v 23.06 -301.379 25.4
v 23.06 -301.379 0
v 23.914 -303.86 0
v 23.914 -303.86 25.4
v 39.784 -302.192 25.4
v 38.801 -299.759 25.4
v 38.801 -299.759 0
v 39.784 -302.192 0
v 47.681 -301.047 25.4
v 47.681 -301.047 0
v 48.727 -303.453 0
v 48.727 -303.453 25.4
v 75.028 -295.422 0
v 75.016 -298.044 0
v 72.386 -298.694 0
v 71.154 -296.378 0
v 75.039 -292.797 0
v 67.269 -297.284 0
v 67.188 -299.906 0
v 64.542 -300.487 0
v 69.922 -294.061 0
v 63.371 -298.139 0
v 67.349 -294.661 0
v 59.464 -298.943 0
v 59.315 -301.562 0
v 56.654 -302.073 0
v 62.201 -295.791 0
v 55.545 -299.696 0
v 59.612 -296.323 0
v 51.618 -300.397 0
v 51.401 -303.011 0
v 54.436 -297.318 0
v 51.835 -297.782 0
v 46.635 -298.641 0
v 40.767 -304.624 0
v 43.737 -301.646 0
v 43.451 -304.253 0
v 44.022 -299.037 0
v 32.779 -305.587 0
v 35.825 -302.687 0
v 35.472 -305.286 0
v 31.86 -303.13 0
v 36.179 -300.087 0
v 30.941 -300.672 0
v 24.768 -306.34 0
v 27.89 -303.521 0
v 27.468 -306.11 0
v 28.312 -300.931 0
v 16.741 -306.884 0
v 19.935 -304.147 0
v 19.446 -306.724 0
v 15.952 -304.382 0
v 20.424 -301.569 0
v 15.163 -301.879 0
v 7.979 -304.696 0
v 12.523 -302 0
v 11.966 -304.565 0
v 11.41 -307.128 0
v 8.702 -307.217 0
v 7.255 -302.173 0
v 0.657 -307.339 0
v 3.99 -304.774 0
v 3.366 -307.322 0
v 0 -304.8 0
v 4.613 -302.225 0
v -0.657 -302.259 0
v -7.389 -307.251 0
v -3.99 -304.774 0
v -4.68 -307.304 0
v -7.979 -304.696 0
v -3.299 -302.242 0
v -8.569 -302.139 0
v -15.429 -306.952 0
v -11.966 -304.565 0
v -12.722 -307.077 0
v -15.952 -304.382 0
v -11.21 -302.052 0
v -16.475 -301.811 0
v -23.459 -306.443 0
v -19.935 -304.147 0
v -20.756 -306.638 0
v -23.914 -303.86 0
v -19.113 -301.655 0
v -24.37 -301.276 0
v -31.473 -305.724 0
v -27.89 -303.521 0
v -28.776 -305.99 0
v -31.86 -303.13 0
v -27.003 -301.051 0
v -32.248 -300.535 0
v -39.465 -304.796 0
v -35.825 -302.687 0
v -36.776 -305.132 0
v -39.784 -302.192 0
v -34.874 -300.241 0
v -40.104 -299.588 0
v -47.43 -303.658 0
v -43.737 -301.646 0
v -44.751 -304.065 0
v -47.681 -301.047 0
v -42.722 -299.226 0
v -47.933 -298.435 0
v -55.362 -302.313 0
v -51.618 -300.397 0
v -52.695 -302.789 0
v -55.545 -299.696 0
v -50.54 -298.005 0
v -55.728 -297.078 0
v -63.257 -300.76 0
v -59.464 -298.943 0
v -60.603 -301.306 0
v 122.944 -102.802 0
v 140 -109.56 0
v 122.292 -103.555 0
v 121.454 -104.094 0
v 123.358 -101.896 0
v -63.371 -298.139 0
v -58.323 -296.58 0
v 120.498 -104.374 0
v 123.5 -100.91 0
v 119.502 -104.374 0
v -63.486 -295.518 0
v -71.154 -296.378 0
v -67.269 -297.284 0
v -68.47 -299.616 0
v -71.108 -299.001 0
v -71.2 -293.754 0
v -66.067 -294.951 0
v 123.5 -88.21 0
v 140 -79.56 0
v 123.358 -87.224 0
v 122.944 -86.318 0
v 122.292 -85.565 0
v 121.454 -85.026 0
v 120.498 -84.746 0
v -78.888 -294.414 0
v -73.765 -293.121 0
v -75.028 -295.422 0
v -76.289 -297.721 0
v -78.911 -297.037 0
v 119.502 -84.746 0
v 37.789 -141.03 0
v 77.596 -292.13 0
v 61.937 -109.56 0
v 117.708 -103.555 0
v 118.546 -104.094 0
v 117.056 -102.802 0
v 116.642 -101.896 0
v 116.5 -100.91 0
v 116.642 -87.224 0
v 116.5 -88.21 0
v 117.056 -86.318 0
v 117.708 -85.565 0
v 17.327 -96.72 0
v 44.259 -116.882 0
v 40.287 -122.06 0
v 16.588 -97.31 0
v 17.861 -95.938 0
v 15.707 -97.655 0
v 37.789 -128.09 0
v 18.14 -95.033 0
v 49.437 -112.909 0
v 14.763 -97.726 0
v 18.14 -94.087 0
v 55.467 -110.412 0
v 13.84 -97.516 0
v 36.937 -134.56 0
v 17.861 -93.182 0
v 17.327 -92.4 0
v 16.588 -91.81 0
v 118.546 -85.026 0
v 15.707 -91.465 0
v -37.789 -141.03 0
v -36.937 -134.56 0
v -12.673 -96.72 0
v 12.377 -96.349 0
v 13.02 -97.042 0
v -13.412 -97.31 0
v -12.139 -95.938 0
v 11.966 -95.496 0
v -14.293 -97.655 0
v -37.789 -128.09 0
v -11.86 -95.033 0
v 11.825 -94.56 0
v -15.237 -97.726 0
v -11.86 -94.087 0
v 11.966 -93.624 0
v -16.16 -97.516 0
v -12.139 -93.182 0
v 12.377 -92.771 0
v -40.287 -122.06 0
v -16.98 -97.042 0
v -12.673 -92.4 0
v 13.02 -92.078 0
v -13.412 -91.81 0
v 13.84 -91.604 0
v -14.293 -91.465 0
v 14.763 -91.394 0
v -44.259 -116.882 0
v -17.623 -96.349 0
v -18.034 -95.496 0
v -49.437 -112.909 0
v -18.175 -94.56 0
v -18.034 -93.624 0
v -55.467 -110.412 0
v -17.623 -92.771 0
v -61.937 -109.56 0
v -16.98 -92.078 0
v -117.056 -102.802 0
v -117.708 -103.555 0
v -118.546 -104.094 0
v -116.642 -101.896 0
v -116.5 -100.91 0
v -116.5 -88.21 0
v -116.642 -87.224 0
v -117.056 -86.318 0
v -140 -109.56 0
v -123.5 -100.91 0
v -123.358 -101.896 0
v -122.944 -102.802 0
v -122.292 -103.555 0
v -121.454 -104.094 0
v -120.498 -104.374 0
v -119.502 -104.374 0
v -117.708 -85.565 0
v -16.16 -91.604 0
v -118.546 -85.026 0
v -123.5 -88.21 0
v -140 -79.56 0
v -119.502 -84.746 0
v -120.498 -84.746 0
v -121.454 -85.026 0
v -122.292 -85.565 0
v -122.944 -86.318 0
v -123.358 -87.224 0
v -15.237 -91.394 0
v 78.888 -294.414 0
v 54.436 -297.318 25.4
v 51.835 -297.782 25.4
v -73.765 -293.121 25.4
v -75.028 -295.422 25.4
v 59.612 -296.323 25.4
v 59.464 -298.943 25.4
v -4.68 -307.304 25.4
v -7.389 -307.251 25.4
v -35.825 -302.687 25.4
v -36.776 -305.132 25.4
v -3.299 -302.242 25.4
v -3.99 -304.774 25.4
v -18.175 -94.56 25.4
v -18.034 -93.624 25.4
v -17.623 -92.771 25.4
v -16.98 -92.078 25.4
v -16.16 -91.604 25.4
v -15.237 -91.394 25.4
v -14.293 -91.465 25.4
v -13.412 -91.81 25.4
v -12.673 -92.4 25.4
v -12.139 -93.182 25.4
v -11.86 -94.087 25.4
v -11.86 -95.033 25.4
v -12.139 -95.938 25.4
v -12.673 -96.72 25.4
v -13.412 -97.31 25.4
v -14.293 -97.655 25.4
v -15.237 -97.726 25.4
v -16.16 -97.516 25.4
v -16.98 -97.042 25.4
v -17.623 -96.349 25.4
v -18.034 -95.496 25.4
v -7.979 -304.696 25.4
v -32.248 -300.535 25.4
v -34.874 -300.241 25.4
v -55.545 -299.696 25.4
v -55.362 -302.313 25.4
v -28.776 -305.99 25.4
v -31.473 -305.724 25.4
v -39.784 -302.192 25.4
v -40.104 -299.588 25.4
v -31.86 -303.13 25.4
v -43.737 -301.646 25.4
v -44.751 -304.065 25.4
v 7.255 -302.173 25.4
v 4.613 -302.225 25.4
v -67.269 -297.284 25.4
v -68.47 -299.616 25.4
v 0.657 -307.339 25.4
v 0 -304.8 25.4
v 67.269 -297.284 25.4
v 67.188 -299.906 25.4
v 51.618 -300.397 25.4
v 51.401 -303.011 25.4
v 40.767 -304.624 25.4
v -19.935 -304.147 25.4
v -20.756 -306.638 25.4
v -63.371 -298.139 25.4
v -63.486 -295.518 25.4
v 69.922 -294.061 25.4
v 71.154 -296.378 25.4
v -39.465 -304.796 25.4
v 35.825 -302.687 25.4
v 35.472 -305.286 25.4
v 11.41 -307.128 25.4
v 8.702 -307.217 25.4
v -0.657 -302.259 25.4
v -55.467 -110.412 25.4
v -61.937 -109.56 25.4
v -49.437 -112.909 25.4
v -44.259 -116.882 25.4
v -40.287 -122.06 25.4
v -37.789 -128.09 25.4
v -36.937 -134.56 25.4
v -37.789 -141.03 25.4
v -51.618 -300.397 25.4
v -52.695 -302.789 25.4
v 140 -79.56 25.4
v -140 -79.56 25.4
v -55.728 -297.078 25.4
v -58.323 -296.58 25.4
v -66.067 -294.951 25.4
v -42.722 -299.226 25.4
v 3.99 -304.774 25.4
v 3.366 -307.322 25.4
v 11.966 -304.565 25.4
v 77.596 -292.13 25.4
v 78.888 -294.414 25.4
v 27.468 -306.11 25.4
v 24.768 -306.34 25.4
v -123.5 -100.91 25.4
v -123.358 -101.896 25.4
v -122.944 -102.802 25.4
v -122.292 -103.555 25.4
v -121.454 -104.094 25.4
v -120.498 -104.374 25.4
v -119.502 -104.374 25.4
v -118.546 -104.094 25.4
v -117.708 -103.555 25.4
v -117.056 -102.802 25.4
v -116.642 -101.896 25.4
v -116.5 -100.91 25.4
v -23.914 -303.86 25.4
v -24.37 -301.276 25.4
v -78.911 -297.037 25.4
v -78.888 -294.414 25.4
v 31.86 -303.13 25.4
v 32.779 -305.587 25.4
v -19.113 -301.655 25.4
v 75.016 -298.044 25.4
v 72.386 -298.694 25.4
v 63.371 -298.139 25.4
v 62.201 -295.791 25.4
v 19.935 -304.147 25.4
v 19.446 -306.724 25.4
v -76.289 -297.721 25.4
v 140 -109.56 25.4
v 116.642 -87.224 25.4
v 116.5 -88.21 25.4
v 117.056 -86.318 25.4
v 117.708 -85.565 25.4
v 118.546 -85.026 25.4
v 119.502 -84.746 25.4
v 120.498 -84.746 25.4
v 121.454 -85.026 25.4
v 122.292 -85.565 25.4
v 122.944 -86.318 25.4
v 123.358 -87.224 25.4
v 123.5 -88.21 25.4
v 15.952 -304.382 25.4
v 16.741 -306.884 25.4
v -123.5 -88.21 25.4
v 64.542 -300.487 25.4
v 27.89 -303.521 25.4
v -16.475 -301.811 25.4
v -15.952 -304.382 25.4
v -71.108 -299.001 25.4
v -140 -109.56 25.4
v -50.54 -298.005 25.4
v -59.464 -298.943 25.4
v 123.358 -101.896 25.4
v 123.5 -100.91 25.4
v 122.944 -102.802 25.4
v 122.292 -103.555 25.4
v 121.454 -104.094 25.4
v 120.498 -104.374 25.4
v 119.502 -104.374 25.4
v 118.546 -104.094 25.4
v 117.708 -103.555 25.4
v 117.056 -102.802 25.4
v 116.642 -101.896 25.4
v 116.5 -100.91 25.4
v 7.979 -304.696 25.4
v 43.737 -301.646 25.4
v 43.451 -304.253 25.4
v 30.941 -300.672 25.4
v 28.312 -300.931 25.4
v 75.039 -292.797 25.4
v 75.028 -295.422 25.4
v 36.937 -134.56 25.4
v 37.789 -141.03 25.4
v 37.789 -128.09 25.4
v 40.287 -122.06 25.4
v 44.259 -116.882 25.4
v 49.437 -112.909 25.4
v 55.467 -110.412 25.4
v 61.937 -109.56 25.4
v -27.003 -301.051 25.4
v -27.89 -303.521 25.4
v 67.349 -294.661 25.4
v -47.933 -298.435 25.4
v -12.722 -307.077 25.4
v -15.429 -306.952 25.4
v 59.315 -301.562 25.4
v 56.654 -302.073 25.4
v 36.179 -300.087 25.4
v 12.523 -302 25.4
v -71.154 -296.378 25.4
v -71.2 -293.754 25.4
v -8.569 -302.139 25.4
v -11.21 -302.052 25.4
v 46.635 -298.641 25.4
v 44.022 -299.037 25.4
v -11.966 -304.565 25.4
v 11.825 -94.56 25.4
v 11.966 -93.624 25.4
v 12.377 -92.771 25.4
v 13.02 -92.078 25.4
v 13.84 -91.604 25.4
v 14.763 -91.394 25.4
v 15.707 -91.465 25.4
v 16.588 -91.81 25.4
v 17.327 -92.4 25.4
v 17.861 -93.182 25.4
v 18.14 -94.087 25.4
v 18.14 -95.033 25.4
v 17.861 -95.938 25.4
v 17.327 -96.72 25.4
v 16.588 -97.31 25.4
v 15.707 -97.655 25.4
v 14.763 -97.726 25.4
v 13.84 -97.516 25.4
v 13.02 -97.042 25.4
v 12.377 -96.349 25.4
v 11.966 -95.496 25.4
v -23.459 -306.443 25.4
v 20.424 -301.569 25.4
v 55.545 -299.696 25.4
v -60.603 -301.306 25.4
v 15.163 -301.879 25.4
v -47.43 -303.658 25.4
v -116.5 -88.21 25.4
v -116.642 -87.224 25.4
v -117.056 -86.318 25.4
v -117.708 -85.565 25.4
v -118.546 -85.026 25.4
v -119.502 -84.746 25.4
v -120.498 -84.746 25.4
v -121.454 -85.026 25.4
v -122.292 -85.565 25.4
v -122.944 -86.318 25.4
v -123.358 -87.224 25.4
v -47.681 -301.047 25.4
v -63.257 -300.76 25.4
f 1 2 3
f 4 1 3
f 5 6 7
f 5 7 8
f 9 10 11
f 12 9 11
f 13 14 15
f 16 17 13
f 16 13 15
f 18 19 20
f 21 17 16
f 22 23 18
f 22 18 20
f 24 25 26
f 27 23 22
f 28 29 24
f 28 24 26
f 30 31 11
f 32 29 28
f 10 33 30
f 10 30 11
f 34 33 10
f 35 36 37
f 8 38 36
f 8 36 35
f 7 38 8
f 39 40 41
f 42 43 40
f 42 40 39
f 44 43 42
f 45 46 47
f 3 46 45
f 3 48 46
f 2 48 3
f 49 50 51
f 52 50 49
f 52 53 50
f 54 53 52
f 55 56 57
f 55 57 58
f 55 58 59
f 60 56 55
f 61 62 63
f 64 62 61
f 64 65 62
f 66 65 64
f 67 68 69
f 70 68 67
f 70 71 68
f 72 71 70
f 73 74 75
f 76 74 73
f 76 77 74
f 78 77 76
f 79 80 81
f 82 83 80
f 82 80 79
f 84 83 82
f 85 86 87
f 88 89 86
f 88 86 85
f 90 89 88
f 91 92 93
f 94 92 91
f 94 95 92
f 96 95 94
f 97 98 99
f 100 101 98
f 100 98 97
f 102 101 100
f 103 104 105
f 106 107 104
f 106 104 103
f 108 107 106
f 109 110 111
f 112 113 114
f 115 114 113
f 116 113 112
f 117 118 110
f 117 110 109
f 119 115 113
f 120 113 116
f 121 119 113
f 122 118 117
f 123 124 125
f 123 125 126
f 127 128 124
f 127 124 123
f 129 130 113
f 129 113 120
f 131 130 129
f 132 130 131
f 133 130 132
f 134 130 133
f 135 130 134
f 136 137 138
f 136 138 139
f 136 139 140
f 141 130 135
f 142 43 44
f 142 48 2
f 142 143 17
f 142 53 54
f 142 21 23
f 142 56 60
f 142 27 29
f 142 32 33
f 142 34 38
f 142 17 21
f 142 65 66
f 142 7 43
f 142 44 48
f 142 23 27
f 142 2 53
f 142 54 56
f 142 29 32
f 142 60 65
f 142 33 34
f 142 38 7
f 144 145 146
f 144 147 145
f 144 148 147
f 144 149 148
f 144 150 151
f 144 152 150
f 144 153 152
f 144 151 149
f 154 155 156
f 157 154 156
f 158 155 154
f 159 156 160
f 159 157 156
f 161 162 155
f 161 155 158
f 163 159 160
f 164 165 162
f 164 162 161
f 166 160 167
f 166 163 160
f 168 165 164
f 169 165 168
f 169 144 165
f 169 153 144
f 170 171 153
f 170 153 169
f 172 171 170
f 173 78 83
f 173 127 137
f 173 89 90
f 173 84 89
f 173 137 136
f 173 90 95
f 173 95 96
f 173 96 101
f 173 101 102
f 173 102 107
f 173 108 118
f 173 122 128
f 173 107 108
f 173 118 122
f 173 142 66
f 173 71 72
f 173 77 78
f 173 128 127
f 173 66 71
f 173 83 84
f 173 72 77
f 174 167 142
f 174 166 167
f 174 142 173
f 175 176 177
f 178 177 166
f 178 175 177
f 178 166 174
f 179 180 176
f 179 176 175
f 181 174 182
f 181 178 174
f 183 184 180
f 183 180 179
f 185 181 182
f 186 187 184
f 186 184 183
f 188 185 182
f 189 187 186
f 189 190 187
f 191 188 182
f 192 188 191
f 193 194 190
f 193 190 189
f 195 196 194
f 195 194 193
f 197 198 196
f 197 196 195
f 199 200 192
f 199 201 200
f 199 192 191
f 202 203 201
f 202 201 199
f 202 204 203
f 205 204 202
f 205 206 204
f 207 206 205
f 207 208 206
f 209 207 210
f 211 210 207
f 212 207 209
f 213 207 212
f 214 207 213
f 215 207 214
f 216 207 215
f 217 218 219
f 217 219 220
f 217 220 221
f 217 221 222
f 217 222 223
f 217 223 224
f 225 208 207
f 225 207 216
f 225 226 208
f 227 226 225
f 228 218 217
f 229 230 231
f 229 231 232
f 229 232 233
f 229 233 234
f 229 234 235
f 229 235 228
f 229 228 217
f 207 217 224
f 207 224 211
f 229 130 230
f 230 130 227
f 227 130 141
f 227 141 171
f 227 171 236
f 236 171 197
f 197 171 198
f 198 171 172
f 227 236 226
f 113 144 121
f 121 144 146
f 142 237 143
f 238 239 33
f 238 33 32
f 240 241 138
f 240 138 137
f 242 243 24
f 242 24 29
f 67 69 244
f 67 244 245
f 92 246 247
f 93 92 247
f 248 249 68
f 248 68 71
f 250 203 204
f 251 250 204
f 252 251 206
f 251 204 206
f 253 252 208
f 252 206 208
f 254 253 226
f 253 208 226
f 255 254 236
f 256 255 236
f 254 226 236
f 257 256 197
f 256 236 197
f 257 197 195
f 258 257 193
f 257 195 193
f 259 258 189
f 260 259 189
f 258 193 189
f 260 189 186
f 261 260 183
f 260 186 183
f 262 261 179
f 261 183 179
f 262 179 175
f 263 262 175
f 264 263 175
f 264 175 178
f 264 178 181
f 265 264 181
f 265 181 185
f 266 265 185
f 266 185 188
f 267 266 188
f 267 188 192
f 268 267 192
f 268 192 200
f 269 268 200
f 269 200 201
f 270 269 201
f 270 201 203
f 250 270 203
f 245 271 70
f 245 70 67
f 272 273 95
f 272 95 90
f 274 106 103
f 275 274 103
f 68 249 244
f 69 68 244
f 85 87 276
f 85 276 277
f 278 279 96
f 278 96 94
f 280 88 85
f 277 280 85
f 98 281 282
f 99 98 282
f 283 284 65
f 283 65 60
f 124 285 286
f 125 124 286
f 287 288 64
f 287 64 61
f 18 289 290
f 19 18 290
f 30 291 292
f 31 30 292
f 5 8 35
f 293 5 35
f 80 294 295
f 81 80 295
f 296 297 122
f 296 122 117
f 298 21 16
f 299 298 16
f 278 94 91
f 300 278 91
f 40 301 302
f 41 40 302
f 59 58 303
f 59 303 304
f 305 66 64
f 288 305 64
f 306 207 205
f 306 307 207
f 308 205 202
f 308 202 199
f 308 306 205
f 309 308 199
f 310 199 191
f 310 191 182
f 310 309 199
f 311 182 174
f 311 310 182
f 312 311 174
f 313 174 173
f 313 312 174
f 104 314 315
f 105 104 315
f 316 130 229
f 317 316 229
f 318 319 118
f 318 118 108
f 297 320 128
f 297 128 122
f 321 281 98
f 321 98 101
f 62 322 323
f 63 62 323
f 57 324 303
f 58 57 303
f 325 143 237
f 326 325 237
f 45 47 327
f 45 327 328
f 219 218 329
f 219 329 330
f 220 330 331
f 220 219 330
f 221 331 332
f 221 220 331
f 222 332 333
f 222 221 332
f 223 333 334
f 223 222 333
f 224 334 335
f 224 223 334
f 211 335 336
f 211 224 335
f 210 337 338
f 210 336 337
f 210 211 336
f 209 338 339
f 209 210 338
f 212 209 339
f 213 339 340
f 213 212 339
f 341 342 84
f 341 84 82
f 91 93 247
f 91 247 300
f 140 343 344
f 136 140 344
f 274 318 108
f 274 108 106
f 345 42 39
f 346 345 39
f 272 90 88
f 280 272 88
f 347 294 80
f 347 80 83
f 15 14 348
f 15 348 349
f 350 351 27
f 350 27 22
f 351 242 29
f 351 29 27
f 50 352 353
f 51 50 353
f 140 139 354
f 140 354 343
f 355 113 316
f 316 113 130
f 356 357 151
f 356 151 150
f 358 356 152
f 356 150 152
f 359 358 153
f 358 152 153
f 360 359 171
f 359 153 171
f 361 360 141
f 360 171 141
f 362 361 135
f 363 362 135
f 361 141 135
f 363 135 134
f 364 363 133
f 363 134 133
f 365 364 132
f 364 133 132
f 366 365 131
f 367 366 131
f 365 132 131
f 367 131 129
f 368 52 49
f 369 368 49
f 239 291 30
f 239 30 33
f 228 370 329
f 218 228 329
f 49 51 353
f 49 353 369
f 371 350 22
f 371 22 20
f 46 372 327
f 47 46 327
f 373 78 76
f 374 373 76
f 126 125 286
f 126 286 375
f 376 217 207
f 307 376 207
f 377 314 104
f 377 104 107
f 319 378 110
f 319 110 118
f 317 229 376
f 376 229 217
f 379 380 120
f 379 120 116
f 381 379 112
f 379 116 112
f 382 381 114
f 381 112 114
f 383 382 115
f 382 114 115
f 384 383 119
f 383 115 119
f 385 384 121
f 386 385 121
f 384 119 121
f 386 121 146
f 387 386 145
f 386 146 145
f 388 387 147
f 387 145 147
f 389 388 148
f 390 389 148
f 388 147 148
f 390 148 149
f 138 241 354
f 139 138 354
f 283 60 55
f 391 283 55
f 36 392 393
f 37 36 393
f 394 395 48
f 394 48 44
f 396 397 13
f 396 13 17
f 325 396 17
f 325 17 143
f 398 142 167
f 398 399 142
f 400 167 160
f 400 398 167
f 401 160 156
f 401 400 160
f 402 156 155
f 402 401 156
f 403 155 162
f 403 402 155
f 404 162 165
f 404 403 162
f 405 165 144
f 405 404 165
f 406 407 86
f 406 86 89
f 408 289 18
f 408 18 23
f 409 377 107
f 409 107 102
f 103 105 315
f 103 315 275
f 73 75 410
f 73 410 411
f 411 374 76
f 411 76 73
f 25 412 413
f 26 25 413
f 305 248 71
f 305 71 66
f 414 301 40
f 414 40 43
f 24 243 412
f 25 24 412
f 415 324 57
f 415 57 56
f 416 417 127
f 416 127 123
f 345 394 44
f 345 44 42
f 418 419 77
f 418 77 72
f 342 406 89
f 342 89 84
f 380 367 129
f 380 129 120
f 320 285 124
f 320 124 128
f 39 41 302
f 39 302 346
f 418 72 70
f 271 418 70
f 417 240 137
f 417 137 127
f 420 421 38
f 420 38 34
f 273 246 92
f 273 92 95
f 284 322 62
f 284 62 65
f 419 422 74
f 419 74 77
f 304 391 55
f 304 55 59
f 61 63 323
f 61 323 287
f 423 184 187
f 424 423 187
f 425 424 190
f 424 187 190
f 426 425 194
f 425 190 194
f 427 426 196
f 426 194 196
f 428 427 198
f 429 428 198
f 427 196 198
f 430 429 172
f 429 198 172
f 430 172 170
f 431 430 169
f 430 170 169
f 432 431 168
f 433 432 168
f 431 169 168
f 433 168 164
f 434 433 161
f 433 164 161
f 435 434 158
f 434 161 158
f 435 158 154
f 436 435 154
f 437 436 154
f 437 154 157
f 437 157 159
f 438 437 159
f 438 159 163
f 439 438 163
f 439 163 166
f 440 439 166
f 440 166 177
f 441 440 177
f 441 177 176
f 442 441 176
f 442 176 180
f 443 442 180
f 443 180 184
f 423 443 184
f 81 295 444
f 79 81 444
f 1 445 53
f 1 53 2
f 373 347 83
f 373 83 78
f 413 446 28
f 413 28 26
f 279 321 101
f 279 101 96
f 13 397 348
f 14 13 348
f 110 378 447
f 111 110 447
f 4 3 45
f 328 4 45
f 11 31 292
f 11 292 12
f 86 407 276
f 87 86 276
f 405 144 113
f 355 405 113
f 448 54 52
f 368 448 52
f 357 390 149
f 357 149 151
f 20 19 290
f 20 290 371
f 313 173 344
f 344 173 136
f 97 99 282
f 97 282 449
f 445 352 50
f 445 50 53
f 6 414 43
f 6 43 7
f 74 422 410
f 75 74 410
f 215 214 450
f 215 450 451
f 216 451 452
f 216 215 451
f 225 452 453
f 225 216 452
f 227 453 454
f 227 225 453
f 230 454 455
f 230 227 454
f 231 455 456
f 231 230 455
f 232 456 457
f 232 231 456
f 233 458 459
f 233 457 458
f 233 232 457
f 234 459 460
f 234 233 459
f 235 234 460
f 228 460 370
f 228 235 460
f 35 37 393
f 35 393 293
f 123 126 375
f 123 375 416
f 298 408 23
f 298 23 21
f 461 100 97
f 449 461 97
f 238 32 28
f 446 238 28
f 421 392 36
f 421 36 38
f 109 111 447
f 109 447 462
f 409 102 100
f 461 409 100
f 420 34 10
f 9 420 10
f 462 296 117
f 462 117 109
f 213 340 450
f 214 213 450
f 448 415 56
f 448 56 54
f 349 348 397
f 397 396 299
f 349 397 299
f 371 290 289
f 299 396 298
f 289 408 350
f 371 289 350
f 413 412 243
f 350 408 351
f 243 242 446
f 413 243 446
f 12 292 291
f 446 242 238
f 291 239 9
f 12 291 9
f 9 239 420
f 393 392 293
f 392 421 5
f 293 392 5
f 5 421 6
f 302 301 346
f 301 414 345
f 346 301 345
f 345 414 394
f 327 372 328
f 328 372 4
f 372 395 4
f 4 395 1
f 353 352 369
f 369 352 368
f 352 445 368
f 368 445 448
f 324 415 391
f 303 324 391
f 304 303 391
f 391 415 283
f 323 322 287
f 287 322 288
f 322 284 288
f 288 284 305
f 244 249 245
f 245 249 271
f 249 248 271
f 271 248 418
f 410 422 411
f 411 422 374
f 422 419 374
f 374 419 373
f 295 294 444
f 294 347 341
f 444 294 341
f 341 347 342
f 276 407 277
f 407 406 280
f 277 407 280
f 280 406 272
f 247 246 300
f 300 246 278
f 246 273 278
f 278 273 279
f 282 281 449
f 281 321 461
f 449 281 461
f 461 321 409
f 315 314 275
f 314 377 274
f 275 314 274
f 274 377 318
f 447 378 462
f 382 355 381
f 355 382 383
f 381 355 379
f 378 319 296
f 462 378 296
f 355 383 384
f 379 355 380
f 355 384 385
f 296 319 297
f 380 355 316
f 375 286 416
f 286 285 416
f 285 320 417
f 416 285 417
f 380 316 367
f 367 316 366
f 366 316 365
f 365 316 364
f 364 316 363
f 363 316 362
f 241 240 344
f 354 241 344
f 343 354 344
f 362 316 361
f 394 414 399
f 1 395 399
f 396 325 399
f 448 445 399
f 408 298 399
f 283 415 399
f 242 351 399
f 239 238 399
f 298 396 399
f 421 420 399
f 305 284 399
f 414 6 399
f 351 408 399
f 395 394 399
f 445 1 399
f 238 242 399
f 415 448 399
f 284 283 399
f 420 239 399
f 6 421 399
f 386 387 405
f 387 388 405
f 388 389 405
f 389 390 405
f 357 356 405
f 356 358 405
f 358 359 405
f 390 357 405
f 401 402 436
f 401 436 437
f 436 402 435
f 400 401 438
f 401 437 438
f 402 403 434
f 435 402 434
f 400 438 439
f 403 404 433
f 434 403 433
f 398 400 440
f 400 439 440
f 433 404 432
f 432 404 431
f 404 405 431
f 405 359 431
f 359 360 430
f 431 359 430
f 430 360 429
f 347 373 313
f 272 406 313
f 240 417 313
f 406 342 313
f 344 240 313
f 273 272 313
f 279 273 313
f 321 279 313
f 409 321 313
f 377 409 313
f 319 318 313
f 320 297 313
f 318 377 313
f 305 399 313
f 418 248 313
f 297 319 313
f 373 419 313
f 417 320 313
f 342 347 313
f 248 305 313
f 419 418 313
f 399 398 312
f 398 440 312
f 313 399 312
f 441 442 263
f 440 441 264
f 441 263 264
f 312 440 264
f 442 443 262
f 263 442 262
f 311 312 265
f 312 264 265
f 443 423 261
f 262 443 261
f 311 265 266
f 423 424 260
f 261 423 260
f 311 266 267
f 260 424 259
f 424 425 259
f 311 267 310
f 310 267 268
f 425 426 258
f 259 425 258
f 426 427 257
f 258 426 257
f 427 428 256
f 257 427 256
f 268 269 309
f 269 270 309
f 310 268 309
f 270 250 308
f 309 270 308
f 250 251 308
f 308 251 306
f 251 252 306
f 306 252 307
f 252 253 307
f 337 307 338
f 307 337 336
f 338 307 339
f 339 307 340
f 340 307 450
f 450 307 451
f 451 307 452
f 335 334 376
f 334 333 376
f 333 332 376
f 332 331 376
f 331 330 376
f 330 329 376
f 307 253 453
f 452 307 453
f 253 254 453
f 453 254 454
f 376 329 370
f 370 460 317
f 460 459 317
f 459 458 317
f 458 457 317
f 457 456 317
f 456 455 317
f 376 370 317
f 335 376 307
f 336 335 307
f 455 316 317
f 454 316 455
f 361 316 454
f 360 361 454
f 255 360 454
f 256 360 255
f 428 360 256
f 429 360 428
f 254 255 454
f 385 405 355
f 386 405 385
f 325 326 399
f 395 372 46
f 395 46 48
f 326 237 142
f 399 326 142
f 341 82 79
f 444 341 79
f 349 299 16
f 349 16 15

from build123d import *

# Parameters (mm, degrees)
BOSS_EXTRUDE2_DEPTH = 25.4
FILLET1_R           = 25
BOSS_EXTRUDE4_DEPTH = 25.4
CUT_EXTRUDE2_DEPTH  = 337.375088257
CIRPATTERN8_COUNT   = 20
CIRPATTERN8_ANGLE   = 28.5
SKETCH5_R           = 3.175
CUT_EXTRUDE3_DEPTH  = 339.677729262


with BuildPart() as part:
    # Sketch3 → Boss-Extrude2 (new body)
    with BuildSketch(Plane.XY):
        with BuildLine():
            Line((-140, -79.56), (-140, -109.56))
            Line((-140, -109.56), (-29.356513523, -109.56))
            Line((-29.356513523, -109.56), (-78.888044947, -294.414191853))
            ThreePointArc((-78.888044947, -294.414191853), (0, -304.8), (78.888044947, -294.414191853))
            Line((78.888044947, -294.414191853), (29.356513523, -109.56))
            Line((29.356513523, -109.56), (140, -109.56))
            Line((140, -109.56), (140, -79.56))
            Line((140, -79.56), (-140, -79.56))
        make_face()
    extrude(amount=BOSS_EXTRUDE2_DEPTH)

    # Fillet1
    fillet1_edges = [part.edges().sort_by_distance(p)[0] for p in [
        (29.356513523, -109.56, 12.7),
        (-29.356513523, -109.56, 12.7),
    ]]
    fillet(fillet1_edges, radius=FILLET1_R)

    # Sketch14 → Boss-Extrude4 (add)
    with BuildSketch(Plane(origin=(0, 0, 0), x_dir=(-1, 0, 0), z_dir=(0, 0, -1))):
        with BuildLine():
            Line((78.910933272, -297.036934084), (78.888044947, -294.414191853))
            ThreePointArc((78.888044947, -294.414191853), (76.959432674, -294.924203351), (75.027523715, -295.421581279))
            Line((75.027523715, -295.421581279), (76.289081309, -297.721097125))
            Line((76.289081309, -297.721097125), (78.910933272, -297.036934084))
        make_face()
    boss_extrude4 = extrude(amount=-BOSS_EXTRUDE4_DEPTH)

    # Sketch16 → Cut-Extrude2 (cut, symmetric)
    with BuildSketch(Plane(origin=(0, 0, 0), x_dir=(-1, 0, 0), z_dir=(0, 0, -1))):
        Polygon((372.937709596, -838.440145613), (75.027523715, -295.421581279), (73.765262731, -293.12078332), (71.19993834, -293.754449124), (71.154137831, -296.378353915), (60.344615656, -915.654378233), (357.400151379, -2118.250141136), (669.993245319, -2041.035908516), align=None)
    cut_extrude2 = extrude(amount=CUT_EXTRUDE2_DEPTH, both=True, mode=Mode.SUBTRACT)

    # CirPattern8: Boss-Extrude4, Cut-Extrude2 ×20 about axis
    cirpattern8_axis = Axis((0, 0, 0), (0, 0, 1))
    add([boss_extrude4.rotate(cirpattern8_axis, i * CIRPATTERN8_ANGLE / (CIRPATTERN8_COUNT - 1)) for i in range(1, CIRPATTERN8_COUNT)])
    add([cut_extrude2.rotate(cirpattern8_axis, i * CIRPATTERN8_ANGLE / (CIRPATTERN8_COUNT - 1)) for i in range(1, CIRPATTERN8_COUNT)], mode=Mode.SUBTRACT)

    # Sketch5 → Cut-Extrude3 (cut, through all)
    with BuildSketch(Plane(origin=(0, 0, 0), x_dir=(-1, 0, 0), z_dir=(0, 0, -1))):
        with Locations((-15, -94.56)):
            Circle(SKETCH5_R)
        with Locations((15, -94.56)):
            Circle(SKETCH5_R)
        with BuildLine():
            Line((-123.5, -94.56), (-123.5, -100.91))
            ThreePointArc((-123.5, -100.91), (-120, -104.41), (-116.5, -100.91))
            Line((-116.5, -100.91), (-116.5, -94.56))
            Line((-116.5, -94.56), (-116.5, -88.21))
            ThreePointArc((-116.5, -88.21), (-120, -84.71), (-123.5, -88.21))
            Line((-123.5, -88.21), (-123.5, -94.56))
        make_face()
        with BuildLine():
            Line((116.5, -94.56), (116.5, -88.21))
            ThreePointArc((116.5, -88.21), (120, -84.71), (123.5, -88.21))
            Line((123.5, -88.21), (123.5, -94.56))
            Line((123.5, -94.56), (123.5, -100.91))
            ThreePointArc((123.5, -100.91), (120, -104.41), (116.5, -100.91))
            Line((116.5, -100.91), (116.5, -94.56))
        make_face()
    extrude(amount=-CUT_EXTRUDE3_DEPTH, mode=Mode.SUBTRACT)


solid = part.part
